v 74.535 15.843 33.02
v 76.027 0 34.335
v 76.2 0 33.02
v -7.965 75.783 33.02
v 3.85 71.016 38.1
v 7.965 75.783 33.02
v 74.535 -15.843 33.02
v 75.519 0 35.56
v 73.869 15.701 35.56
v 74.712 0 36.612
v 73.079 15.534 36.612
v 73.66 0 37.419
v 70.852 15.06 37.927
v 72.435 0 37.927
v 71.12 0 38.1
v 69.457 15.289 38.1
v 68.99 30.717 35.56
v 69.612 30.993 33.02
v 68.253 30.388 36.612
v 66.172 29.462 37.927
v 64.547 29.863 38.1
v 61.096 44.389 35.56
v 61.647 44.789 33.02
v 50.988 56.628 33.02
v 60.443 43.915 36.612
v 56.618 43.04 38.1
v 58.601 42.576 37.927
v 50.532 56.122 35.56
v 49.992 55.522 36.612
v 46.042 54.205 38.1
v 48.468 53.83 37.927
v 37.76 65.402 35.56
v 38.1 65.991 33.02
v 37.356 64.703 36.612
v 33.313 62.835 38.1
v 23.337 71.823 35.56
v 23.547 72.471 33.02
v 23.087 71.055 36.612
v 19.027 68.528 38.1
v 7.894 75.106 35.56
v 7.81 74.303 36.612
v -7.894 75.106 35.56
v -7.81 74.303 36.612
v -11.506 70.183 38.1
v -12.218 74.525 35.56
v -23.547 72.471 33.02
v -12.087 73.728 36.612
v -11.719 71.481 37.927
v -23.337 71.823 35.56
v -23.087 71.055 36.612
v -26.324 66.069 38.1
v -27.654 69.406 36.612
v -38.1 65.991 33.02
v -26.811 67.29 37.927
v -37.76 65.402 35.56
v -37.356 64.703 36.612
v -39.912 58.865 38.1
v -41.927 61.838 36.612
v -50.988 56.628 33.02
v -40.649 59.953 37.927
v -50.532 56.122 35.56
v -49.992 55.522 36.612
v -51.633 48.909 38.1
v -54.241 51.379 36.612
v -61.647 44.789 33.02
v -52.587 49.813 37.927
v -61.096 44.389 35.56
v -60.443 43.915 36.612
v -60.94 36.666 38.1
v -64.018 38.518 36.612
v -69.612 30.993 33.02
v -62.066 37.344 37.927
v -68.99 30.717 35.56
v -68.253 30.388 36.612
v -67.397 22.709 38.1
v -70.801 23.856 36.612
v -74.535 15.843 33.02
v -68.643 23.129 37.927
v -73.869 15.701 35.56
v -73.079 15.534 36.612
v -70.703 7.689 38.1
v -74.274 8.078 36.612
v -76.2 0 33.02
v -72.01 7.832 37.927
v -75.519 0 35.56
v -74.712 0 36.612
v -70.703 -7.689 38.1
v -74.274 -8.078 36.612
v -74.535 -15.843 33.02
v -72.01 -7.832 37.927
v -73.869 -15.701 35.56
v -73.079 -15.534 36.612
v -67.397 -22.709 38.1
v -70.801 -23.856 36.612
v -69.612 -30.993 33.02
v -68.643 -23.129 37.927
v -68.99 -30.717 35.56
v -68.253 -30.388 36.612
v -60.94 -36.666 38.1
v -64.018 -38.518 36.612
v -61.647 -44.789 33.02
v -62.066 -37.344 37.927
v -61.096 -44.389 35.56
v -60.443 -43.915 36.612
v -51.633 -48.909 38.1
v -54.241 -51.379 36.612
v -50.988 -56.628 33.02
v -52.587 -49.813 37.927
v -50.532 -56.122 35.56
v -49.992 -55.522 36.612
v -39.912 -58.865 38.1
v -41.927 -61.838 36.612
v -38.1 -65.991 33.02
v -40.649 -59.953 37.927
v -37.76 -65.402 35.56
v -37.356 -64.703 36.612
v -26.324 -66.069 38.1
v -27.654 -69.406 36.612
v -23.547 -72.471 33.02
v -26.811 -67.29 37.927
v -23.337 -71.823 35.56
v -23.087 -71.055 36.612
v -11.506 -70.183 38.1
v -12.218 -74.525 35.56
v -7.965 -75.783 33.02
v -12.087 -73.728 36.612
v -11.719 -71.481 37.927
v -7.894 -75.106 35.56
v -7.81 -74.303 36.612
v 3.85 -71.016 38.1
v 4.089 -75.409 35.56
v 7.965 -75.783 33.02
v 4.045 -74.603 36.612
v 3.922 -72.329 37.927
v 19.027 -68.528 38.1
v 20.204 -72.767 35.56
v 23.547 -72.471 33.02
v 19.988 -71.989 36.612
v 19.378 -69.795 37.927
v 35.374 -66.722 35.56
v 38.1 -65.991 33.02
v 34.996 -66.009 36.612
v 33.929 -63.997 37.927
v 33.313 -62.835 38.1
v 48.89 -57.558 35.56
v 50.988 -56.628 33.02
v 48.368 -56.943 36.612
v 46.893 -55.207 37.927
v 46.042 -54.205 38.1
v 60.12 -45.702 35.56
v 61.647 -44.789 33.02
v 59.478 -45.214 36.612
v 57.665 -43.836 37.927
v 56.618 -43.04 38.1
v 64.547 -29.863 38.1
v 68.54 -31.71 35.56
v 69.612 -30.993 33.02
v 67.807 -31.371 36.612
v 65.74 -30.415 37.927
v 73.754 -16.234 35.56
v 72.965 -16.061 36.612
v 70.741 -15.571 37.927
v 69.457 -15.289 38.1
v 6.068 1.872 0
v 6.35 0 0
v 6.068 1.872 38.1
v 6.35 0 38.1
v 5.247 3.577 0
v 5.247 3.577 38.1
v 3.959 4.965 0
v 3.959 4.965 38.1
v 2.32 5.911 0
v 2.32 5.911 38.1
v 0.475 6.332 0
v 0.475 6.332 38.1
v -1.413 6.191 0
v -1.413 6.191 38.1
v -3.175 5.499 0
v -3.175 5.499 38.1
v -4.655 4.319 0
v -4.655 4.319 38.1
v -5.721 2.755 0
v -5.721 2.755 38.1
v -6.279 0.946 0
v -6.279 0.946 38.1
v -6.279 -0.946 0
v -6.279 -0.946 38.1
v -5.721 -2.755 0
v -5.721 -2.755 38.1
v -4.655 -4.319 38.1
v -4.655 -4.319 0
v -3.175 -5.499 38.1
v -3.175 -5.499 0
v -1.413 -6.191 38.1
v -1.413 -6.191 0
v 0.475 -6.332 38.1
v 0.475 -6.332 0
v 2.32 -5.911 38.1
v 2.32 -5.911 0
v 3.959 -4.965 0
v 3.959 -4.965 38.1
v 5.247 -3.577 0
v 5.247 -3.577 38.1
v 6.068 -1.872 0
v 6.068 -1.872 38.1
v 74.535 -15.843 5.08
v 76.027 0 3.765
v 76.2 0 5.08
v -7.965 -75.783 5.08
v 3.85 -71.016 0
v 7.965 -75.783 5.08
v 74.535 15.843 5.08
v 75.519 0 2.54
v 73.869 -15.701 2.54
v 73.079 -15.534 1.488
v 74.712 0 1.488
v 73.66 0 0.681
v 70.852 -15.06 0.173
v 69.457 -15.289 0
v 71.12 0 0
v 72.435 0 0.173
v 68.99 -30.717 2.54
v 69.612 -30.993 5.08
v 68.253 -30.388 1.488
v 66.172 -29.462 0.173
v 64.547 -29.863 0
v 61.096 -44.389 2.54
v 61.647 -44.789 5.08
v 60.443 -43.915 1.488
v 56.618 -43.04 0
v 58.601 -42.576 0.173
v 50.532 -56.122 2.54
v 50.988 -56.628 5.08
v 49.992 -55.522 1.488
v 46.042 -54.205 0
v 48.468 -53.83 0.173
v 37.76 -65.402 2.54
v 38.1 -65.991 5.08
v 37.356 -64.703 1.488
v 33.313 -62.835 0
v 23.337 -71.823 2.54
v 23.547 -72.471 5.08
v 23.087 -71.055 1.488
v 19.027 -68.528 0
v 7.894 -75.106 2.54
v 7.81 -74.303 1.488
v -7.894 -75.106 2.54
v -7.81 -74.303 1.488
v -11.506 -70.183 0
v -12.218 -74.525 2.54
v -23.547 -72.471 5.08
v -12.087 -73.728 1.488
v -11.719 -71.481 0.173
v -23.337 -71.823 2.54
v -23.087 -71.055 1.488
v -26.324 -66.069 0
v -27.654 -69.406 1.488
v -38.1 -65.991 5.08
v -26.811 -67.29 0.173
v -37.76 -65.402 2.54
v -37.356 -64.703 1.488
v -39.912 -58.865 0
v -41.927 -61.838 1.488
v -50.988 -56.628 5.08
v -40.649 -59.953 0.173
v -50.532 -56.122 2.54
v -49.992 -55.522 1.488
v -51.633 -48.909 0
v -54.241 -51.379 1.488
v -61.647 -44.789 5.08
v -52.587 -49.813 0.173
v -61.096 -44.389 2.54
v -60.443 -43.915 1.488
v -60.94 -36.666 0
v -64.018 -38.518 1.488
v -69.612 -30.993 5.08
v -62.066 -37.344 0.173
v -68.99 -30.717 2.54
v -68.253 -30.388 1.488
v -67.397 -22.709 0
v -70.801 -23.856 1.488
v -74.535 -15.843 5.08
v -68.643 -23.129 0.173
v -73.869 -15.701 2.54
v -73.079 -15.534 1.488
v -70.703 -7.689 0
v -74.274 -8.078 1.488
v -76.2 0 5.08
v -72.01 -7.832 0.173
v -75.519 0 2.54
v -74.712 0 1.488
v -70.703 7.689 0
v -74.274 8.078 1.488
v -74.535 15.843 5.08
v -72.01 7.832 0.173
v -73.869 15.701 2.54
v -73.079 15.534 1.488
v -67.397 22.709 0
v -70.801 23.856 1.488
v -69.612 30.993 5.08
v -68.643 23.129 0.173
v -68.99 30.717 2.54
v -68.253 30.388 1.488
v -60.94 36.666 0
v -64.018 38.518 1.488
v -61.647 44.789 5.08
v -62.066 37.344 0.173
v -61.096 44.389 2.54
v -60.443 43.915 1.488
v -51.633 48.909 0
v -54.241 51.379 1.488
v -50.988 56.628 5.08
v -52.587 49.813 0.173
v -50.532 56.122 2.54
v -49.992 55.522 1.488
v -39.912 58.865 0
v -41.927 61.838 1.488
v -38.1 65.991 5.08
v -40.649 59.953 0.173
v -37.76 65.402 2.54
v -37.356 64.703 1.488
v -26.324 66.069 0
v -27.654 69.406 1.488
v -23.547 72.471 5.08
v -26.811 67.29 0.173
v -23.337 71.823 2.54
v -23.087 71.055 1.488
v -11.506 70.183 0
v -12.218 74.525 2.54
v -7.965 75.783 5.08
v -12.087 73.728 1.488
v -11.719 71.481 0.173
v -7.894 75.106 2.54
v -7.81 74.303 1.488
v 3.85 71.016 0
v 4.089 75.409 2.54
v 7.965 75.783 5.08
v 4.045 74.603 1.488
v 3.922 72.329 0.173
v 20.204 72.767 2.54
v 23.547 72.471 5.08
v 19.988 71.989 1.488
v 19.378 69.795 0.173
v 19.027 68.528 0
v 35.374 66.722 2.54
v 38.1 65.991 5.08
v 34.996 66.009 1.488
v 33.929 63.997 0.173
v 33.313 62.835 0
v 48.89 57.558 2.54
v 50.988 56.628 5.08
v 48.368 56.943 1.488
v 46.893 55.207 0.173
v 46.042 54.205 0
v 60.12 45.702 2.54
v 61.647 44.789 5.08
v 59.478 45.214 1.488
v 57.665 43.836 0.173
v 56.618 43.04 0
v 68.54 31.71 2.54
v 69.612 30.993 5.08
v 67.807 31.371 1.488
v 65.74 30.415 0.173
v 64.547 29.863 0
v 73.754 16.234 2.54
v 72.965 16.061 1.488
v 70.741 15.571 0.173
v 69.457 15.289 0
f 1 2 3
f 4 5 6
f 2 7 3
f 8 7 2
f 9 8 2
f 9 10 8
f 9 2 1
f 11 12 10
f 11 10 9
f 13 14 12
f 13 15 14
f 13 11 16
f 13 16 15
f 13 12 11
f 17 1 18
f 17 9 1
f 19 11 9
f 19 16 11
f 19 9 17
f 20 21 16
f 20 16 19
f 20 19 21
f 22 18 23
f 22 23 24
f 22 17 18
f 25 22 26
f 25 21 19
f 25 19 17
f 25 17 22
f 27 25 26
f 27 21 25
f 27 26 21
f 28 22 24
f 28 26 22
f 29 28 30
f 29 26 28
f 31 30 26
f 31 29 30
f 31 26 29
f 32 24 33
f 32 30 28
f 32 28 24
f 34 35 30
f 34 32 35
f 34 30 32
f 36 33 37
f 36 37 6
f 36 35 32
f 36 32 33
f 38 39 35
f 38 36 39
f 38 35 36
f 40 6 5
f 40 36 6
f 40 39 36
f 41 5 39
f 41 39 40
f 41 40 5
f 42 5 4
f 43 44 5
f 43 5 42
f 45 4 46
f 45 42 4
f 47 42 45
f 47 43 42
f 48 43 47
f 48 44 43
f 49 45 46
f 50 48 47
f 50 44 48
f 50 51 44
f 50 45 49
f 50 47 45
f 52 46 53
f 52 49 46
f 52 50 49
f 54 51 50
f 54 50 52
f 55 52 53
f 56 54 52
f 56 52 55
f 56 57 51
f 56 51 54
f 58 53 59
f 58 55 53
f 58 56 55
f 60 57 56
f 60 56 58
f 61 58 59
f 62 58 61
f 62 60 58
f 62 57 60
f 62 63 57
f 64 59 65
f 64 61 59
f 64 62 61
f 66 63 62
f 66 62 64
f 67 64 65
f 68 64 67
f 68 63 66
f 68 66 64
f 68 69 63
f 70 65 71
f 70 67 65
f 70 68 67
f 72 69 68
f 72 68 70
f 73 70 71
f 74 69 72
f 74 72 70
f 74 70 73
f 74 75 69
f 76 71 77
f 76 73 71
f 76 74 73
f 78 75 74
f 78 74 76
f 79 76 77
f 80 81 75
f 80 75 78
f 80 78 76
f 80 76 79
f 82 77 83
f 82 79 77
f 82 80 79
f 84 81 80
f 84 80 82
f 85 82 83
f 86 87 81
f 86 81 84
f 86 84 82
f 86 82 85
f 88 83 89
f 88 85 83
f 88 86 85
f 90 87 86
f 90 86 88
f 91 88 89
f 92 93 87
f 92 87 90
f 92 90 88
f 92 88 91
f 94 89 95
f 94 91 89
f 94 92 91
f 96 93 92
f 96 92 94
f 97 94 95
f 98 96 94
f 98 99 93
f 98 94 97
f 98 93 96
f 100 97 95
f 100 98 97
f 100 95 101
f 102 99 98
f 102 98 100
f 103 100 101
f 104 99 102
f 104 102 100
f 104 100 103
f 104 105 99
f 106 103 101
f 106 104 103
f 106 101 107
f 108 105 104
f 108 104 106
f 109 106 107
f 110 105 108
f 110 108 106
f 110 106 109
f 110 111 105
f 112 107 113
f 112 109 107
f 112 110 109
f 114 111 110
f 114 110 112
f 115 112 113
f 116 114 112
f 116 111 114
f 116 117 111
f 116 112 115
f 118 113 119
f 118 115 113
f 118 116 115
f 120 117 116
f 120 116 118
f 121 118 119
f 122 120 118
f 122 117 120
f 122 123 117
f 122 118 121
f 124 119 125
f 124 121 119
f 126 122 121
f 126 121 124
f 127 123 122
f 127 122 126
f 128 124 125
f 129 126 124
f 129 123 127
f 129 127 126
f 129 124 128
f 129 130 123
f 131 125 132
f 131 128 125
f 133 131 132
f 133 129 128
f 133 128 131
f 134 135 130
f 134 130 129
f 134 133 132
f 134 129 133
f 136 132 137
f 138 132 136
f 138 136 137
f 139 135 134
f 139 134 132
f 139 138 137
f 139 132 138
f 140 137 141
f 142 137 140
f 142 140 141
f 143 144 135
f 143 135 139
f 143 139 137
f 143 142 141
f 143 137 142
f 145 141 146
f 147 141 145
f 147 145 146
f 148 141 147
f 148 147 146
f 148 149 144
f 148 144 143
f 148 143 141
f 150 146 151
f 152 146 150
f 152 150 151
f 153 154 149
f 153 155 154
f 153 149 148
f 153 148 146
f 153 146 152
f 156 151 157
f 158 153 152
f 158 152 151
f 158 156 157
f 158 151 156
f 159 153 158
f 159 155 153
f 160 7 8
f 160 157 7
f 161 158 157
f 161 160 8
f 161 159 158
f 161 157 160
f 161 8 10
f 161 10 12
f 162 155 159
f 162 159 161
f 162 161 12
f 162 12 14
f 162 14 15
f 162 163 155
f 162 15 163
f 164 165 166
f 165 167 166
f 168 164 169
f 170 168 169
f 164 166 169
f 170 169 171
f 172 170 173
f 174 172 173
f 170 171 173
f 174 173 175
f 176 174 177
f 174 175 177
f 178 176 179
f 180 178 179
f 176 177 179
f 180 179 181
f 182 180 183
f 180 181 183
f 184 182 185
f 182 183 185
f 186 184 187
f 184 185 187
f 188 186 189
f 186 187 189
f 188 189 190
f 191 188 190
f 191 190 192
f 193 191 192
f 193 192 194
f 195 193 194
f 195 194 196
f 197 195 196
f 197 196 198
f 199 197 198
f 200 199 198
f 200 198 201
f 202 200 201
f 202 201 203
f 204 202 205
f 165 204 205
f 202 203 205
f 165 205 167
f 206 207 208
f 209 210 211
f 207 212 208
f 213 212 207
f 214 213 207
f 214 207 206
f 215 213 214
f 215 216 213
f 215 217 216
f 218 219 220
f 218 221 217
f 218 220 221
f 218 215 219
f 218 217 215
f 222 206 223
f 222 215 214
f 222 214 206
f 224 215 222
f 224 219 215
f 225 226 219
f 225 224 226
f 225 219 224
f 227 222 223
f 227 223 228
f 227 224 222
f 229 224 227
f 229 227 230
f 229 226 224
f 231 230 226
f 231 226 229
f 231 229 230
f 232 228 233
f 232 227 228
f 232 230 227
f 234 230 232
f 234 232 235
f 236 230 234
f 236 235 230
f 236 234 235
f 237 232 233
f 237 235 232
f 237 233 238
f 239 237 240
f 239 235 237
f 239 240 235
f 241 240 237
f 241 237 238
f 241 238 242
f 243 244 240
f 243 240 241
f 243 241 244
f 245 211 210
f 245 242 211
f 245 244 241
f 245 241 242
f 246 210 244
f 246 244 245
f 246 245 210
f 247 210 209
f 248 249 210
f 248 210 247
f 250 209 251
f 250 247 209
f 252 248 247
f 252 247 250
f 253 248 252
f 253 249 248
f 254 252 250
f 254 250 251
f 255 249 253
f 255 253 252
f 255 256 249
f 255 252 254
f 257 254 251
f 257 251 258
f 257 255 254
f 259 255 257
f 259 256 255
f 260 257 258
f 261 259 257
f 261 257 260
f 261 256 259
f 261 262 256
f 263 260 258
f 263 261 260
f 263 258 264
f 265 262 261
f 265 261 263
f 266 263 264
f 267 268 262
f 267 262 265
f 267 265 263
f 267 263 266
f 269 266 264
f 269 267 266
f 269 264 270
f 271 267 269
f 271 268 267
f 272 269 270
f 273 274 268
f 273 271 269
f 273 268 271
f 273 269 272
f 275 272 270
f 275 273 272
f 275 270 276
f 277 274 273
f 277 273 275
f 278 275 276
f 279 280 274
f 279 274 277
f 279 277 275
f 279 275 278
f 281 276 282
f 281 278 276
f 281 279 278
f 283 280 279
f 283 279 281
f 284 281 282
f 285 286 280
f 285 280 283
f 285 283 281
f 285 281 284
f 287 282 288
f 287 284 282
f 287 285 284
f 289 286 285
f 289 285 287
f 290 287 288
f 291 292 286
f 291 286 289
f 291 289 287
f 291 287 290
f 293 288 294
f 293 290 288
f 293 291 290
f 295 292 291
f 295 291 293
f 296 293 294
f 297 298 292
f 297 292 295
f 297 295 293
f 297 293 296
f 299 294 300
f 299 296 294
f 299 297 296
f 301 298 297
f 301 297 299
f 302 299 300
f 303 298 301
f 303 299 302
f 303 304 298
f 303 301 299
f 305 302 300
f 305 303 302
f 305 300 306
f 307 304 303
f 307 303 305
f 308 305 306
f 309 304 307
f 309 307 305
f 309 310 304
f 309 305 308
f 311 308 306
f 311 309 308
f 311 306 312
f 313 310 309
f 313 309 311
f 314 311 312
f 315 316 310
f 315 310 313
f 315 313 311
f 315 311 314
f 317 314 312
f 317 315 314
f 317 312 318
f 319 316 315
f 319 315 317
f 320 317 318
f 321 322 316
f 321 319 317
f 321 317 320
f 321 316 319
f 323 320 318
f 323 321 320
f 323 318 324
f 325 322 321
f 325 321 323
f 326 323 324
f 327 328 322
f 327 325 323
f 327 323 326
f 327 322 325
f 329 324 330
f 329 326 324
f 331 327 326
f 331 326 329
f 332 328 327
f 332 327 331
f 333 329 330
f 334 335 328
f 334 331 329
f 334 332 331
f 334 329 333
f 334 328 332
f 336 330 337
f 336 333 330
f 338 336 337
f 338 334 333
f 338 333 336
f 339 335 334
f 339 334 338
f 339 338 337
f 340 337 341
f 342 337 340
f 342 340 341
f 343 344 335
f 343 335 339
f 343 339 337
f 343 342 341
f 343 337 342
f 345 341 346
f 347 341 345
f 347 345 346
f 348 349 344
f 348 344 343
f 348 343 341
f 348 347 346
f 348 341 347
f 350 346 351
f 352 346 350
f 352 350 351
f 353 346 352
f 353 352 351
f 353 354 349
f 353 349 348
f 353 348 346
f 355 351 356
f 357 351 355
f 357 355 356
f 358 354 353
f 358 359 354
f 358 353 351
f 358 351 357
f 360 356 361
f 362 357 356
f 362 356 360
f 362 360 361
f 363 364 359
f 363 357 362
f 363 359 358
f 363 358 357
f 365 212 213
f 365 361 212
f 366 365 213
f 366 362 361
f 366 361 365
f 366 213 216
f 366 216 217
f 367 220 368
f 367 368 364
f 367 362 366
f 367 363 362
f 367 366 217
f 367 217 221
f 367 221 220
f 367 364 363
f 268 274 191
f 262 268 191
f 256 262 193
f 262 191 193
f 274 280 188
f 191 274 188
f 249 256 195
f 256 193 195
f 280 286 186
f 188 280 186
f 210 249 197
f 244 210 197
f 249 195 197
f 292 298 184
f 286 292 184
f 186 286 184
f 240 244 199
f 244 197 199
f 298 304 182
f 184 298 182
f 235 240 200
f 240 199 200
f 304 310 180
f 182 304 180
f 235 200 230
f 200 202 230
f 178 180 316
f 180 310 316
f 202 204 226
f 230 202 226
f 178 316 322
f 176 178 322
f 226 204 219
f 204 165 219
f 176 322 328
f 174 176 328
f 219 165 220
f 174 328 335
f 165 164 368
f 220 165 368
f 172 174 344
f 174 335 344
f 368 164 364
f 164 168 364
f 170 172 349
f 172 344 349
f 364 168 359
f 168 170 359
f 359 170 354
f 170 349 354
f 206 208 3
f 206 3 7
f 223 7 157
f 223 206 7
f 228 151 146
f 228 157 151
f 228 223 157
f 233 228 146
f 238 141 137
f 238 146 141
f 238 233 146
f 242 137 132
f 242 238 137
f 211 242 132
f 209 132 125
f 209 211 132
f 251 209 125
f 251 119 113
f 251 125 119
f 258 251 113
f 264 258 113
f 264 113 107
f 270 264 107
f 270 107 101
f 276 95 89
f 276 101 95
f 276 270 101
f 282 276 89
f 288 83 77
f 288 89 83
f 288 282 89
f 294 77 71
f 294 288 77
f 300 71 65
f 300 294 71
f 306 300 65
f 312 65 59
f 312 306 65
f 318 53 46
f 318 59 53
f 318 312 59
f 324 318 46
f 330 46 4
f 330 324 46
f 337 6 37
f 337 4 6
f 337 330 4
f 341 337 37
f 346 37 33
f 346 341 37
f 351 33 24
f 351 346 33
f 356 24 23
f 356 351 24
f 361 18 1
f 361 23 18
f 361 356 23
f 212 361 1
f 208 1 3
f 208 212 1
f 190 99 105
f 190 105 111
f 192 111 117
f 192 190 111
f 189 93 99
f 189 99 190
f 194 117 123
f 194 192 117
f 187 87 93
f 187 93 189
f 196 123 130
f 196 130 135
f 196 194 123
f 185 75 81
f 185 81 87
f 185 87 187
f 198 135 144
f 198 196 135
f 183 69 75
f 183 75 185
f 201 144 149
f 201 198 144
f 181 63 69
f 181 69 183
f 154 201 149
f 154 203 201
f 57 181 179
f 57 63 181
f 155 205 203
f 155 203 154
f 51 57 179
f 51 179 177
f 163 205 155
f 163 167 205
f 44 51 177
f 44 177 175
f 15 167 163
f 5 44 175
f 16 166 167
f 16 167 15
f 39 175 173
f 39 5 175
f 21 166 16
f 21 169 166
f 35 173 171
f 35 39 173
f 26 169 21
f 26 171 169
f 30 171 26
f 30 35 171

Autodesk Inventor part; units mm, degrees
ref_plane "YZ Plane" through (0, 0, 0) normal (1, 0, 0) x (0, 1, 0)
ref_plane "XZ Plane" through (0, 0, 0) normal (0, 1, 0) x (-1, 0, 0)
ref_plane "XY Plane" through (0, 0, 0) normal (0, 0, 1) x (1, 0, 0)
sketch "Sketch1" plane through (0, 0, 0) normal (0, 0, 1) x (1, 0, 0)
  circle A0 centre (0, 0) radius 76.2
  dimension "d0" = 152.4
extrude "Extrusion1" add sketch "Sketch1" along normal blind 38.1
sketch "Sketch2" plane through (0, 0, 38.1) normal (0, 0, 1) x (1, 0, 0)
  circle A0 centre (0, 0) radius 6.35
  dimension "d3" = 12.7
extrude "Extrusion2" cut sketch "Sketch2" against normal blind 38.1
sketch "Sketch3" plane through (0, 0, 38.1) normal (0, 0, 1) x (1, 0, 0)
  point P0 (0, 0)
fillet "Fillet1" radius 5.08 2 edges at (-76.2, 0, 38.1) (-76.2, 0, 0)
properties part number "6 inch wheel"
